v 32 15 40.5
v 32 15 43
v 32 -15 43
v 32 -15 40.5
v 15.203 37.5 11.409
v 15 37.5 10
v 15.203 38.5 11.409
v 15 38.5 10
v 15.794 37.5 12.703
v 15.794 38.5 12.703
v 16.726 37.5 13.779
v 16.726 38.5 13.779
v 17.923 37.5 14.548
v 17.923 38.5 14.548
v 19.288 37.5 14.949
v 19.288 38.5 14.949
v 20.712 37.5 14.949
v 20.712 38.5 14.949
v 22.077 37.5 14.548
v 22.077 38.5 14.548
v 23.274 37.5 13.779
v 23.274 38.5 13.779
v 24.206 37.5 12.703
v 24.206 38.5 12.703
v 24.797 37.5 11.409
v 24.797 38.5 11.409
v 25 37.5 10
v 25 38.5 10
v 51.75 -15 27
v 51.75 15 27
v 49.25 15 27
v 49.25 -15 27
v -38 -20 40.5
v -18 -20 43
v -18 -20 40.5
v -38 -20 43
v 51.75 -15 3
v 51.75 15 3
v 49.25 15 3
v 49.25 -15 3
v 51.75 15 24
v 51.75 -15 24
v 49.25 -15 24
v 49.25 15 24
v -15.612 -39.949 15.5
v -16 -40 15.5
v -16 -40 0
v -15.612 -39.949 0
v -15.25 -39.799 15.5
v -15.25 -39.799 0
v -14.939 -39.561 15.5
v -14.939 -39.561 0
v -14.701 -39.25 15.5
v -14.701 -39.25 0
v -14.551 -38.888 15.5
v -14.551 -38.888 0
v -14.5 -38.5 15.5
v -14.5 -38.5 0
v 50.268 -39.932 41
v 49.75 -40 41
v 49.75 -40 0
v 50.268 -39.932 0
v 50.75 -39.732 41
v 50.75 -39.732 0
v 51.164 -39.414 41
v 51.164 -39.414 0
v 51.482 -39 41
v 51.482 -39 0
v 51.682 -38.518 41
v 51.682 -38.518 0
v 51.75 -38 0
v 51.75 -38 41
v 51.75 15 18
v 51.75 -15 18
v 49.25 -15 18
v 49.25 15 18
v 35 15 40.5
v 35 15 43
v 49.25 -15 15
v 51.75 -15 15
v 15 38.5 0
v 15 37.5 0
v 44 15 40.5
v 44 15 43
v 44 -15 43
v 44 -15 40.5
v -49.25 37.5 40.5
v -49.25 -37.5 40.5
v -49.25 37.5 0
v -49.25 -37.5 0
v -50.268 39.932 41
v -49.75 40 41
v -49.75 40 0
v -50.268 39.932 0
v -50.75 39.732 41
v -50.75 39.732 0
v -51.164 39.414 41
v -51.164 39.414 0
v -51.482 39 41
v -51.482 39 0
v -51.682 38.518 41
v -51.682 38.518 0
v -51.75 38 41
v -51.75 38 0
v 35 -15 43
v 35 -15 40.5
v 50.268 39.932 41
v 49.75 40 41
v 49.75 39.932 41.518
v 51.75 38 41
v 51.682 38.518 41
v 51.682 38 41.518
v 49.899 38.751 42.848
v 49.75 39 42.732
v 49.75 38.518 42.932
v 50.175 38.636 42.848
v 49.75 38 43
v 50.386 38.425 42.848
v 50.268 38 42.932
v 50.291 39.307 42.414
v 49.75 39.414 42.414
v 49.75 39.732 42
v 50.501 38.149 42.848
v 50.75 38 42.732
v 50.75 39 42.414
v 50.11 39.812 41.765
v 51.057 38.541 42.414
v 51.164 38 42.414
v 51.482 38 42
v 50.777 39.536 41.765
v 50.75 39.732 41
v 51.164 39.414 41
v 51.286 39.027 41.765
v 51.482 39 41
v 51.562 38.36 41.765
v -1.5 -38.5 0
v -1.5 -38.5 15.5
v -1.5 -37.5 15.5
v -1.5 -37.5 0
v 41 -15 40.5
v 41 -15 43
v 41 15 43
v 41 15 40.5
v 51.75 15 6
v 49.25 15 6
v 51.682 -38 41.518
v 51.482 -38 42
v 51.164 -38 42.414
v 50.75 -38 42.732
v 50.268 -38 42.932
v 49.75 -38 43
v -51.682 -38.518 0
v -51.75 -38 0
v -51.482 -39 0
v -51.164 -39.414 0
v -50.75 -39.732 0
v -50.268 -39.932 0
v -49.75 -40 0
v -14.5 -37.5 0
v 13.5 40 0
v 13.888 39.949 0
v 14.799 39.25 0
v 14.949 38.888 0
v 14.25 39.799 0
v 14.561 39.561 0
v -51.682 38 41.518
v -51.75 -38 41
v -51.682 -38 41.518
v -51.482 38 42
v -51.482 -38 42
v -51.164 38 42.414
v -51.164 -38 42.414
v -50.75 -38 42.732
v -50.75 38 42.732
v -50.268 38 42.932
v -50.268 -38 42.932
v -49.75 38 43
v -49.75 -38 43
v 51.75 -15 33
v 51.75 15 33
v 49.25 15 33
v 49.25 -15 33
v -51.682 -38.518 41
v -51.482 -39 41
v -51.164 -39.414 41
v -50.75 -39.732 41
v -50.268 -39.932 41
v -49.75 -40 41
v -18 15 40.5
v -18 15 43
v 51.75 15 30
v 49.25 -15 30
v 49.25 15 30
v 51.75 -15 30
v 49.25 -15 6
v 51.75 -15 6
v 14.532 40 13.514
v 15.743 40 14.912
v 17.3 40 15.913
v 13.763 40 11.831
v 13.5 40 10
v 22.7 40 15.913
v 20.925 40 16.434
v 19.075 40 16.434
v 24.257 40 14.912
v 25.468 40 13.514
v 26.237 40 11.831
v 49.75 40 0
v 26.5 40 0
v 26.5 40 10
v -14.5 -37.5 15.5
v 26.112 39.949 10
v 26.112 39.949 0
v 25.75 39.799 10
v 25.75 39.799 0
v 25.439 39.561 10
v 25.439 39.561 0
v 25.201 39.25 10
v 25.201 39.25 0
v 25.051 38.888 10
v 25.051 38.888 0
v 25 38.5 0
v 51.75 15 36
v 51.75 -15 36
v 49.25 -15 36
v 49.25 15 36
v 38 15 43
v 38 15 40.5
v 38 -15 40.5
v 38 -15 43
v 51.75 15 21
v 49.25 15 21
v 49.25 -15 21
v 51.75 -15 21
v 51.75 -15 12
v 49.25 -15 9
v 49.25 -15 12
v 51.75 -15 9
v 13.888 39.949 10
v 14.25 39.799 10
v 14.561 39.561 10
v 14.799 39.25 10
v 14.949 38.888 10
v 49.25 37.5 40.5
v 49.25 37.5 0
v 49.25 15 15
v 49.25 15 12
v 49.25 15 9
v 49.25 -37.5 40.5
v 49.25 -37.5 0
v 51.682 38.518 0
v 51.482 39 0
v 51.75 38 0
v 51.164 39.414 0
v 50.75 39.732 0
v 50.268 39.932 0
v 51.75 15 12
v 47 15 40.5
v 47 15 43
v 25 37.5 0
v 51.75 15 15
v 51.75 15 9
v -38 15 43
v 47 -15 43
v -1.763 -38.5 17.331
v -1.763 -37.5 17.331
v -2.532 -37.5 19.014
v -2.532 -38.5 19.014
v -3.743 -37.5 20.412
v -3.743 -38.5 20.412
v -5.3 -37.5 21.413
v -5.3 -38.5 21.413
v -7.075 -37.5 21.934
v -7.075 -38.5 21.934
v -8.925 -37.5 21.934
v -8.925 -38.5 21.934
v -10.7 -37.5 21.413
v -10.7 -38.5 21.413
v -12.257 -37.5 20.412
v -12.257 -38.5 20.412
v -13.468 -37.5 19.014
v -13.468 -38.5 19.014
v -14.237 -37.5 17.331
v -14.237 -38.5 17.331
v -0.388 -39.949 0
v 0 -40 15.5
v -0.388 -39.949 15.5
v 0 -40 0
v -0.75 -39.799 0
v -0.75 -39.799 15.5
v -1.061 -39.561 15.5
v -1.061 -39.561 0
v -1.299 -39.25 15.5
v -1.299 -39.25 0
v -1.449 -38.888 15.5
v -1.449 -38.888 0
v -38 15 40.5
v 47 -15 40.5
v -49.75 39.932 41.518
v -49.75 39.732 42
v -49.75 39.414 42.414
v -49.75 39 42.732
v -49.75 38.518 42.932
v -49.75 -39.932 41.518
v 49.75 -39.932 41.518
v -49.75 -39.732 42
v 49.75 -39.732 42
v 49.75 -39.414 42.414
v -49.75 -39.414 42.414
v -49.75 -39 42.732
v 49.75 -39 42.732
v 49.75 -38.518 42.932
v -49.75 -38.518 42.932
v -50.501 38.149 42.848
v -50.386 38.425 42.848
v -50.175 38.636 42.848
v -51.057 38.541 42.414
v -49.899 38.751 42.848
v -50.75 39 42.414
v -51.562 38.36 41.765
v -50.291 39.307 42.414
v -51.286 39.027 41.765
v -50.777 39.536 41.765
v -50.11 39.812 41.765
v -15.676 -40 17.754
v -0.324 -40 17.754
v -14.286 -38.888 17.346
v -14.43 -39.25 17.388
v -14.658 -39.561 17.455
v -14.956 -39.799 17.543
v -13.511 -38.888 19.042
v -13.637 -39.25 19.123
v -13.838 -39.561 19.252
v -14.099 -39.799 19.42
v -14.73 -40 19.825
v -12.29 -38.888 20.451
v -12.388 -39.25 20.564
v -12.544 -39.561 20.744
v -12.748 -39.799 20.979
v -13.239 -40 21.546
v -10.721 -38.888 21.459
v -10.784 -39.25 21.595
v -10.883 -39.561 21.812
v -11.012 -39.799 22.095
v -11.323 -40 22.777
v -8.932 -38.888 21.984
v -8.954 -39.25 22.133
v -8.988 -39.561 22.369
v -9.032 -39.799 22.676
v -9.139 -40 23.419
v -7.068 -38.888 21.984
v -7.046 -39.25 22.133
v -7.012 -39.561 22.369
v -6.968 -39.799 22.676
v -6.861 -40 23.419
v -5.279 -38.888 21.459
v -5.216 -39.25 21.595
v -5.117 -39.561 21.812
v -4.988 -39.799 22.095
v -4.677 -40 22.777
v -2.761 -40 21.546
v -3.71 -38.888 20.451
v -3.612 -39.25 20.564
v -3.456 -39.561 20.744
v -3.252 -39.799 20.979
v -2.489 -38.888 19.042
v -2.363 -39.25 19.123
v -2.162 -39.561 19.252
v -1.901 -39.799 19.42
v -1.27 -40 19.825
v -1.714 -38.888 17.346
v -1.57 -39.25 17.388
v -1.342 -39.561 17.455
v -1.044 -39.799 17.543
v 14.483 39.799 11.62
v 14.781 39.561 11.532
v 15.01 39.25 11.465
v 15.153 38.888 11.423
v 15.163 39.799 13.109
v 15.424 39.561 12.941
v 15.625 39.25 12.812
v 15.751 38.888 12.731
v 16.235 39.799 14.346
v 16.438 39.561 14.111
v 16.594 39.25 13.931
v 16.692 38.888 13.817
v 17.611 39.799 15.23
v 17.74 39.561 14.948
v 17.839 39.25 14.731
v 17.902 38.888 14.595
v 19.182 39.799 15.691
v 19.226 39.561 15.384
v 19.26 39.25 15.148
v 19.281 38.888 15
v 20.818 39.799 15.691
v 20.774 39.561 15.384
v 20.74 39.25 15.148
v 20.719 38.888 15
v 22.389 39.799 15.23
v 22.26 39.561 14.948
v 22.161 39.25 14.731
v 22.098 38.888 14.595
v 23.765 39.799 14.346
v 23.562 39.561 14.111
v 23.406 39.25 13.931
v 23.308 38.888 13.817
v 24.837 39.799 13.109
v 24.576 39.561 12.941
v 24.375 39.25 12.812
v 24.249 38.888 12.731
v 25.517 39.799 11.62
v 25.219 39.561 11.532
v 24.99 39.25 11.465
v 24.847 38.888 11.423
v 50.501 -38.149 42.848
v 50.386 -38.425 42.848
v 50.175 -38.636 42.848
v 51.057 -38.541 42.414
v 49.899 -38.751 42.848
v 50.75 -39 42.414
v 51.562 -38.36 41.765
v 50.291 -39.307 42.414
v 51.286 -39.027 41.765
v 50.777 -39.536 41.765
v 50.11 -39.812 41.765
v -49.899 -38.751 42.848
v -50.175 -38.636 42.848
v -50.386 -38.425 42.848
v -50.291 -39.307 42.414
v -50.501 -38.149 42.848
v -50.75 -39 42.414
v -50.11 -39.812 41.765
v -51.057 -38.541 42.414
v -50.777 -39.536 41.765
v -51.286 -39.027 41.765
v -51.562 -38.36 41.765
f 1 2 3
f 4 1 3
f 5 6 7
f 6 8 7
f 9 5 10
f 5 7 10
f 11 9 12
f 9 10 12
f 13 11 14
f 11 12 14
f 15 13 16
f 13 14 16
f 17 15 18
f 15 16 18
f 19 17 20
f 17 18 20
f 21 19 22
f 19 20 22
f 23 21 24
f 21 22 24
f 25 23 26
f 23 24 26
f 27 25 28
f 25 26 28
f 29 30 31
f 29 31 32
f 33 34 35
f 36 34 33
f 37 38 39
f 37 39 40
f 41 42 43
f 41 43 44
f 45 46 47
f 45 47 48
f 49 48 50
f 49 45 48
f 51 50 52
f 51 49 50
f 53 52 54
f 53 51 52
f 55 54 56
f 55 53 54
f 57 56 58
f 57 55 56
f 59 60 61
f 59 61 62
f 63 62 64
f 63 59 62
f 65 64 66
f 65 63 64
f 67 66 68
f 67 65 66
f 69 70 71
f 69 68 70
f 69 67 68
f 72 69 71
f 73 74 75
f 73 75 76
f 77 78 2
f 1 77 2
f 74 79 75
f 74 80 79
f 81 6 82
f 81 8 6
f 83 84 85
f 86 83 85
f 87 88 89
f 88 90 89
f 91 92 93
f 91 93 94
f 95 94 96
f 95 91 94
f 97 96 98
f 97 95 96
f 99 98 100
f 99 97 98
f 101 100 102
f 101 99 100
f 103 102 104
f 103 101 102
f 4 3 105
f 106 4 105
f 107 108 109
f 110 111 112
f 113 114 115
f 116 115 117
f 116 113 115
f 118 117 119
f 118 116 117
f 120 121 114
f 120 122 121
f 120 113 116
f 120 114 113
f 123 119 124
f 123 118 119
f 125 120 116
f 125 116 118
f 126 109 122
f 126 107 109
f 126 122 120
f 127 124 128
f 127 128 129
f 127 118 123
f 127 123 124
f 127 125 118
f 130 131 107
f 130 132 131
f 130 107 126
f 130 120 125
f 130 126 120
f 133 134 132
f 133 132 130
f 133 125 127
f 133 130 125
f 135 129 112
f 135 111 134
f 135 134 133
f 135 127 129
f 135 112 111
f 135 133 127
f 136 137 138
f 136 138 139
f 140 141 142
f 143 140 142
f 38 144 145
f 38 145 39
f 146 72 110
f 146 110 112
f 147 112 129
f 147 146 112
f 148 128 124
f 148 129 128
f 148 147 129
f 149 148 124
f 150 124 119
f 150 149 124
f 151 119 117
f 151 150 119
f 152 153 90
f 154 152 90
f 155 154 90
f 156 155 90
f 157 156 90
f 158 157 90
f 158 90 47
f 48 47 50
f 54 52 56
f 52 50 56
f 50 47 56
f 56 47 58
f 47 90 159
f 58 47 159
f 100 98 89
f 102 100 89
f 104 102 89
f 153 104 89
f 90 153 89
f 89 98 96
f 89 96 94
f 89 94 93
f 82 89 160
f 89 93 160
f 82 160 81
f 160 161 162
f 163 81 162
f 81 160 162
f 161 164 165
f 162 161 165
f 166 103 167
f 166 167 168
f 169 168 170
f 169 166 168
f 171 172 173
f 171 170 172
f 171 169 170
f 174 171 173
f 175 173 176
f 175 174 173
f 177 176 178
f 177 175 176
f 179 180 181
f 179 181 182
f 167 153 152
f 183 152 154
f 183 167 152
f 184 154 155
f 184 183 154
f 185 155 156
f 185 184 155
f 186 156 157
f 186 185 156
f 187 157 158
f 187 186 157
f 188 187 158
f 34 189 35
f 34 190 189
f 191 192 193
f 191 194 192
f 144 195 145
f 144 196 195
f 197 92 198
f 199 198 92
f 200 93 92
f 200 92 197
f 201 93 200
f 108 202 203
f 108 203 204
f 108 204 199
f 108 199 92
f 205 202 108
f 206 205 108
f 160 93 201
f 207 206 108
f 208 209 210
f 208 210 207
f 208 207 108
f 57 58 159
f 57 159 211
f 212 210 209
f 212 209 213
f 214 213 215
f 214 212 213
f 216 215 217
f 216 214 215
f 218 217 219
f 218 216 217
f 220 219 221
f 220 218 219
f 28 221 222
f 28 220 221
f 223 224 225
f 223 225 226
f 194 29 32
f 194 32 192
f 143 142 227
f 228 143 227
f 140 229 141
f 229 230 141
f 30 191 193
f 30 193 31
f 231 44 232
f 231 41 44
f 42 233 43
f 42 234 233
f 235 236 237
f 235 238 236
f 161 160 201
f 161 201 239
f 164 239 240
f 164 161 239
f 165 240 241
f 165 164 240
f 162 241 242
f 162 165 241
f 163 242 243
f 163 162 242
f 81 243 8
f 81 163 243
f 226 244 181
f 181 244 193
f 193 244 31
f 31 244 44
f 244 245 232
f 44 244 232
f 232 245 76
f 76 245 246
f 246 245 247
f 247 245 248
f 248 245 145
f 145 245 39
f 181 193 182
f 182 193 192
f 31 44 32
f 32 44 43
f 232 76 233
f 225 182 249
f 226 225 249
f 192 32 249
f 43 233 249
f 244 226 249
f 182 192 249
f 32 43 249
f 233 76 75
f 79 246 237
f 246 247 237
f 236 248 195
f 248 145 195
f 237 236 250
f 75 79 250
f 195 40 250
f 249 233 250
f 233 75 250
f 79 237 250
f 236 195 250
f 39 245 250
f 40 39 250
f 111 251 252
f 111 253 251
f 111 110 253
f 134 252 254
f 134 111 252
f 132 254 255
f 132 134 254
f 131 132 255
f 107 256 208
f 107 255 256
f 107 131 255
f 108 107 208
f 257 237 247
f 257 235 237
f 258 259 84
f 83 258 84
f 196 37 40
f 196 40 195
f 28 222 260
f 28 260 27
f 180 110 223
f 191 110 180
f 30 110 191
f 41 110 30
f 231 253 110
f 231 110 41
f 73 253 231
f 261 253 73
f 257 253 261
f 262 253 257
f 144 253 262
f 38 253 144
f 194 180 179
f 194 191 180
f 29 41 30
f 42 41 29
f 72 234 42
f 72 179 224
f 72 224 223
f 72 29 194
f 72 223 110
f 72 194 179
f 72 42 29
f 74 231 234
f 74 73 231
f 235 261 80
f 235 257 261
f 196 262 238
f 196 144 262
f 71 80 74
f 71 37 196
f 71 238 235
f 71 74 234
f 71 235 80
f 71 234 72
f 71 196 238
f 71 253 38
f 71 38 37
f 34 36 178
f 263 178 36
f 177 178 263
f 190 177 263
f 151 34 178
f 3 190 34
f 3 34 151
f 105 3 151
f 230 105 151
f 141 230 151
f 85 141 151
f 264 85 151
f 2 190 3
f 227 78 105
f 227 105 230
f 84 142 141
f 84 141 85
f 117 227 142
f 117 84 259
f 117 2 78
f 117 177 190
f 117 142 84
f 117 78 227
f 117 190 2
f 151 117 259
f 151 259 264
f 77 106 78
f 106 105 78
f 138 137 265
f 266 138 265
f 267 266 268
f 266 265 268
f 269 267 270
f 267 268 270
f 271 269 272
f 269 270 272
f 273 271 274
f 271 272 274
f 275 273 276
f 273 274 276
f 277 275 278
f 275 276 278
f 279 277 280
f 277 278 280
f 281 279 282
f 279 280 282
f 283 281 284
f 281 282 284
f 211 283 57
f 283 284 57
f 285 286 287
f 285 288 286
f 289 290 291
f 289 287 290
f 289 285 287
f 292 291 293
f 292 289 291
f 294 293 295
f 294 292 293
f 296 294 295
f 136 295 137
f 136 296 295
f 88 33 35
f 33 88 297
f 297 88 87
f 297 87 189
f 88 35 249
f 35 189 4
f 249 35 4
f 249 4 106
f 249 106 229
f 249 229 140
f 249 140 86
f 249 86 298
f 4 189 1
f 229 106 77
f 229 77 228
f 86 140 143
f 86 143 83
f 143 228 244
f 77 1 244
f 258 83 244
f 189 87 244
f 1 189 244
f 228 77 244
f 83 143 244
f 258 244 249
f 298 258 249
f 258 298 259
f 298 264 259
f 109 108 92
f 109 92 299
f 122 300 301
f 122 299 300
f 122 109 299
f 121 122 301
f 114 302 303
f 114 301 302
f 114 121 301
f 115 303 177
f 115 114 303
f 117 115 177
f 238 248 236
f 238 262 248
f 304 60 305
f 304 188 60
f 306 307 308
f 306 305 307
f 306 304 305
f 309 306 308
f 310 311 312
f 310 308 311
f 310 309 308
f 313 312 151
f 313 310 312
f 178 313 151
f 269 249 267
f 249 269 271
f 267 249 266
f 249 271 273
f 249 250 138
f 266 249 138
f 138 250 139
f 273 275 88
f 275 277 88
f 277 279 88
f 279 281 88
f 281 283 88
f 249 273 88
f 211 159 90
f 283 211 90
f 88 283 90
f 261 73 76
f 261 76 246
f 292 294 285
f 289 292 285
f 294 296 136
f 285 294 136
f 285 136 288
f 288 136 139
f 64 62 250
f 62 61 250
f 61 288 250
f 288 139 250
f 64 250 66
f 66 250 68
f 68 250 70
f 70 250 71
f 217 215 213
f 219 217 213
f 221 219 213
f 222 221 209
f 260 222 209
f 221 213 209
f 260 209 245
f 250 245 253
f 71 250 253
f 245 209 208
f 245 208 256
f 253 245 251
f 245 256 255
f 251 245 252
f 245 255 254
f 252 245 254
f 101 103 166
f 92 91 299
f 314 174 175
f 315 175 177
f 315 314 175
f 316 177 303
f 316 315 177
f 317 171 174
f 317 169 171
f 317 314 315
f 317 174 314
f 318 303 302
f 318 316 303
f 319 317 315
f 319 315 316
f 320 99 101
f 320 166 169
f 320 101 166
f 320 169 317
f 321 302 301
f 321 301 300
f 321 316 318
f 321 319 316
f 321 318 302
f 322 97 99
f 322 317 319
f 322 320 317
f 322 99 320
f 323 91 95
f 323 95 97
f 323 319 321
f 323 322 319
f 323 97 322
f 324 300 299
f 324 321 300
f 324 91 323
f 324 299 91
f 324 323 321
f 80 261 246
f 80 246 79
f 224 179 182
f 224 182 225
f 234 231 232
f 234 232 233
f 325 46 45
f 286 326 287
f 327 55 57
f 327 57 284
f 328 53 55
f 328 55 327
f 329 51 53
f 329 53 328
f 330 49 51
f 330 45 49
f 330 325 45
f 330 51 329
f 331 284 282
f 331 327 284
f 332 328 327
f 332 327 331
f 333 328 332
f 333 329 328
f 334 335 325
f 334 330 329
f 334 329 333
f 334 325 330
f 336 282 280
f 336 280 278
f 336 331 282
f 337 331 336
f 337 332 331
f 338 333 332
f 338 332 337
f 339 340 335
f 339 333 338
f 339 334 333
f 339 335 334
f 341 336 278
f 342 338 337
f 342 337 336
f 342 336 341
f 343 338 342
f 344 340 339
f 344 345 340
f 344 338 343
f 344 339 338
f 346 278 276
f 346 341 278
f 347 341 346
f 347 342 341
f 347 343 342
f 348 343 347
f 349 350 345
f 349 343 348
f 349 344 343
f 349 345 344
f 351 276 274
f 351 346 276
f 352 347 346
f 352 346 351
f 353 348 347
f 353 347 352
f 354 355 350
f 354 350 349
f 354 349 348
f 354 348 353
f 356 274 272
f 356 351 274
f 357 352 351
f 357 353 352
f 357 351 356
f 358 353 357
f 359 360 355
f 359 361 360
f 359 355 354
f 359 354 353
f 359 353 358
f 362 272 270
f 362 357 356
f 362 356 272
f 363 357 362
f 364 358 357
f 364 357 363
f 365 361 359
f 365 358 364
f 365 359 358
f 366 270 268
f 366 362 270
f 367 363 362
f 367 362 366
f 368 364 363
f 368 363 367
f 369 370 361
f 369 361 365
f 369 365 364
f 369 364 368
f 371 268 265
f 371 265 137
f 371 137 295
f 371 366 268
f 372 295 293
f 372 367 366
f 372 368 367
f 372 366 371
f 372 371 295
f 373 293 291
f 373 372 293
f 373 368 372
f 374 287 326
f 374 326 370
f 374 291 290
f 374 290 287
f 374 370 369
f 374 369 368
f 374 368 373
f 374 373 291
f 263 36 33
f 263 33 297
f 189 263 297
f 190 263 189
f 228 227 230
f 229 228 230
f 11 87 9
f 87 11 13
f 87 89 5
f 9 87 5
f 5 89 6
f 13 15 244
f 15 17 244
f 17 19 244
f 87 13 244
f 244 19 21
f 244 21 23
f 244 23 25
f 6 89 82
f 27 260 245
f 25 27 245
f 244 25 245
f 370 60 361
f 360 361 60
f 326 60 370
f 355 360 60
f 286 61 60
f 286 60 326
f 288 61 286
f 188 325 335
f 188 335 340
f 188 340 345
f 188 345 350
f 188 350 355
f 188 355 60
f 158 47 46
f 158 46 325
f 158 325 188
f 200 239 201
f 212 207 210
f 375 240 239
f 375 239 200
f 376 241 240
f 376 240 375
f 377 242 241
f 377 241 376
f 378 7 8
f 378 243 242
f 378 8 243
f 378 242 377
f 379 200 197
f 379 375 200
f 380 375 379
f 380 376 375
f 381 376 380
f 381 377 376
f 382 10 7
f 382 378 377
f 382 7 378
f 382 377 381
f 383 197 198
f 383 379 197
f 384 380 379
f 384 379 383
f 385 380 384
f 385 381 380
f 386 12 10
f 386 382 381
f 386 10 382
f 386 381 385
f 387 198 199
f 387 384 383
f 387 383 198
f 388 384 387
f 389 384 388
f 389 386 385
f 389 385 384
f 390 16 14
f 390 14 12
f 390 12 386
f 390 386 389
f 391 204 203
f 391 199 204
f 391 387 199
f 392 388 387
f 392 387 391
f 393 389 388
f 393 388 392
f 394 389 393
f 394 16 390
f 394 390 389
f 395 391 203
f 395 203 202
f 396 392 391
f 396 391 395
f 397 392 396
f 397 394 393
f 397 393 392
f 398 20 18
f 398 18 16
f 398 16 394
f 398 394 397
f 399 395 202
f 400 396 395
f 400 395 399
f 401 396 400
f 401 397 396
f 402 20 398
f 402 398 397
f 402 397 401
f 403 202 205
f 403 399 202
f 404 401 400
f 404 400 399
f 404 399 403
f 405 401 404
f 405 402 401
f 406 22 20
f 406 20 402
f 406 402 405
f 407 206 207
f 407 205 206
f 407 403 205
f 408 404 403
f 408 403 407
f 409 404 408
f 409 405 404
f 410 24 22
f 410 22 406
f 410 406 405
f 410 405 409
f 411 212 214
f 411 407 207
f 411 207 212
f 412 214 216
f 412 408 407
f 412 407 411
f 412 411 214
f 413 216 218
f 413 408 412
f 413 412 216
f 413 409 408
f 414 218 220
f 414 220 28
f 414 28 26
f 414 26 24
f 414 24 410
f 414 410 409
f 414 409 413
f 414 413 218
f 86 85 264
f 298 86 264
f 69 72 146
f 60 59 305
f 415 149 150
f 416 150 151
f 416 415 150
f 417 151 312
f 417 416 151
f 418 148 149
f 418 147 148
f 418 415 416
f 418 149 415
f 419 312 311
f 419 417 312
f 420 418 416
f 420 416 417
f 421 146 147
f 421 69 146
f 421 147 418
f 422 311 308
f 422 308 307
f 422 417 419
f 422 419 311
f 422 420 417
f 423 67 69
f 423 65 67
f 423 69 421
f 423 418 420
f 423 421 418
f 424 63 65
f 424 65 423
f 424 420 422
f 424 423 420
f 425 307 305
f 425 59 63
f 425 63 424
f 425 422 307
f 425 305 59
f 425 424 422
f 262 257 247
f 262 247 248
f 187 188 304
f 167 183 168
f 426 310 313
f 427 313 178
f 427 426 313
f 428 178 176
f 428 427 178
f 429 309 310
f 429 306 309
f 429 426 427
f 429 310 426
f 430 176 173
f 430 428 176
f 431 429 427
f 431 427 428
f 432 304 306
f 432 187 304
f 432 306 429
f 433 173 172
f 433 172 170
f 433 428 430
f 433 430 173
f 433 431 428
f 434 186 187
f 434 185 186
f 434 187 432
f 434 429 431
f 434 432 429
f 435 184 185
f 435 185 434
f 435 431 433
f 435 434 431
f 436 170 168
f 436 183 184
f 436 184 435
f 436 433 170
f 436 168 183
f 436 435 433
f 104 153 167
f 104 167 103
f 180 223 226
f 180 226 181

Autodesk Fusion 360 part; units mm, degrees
sketch "スケッチ1" plane through (0, 0, 0) normal (0, 0, 1) x (1, 0, 0)
  line L0 (-51.75, 40) -> (51.75, 40)
  line L1 (51.75, 40) -> (51.75, -40)
  line L2 (51.75, -40) -> (-51.75, -40)
  line L3 (-51.75, -40) -> (-51.75, 40)
  dimension "d1" = 103.5
  dimension "d2" = 80
  dimension "d32" = 51.75
  dimension "d33" = 40
extrude "押し出し1" add sketch "スケッチ1" along normal blind 2.5 makes body 1
extrude "押し出し4" add sketch "スケッチ1" along normal blind 43 separate body makes body 2
shell "シェル2" thickness 2.5 removed faces 1 at (-17.25, -13.3333, 0) on bodies 2
sketch "スケッチ2" plane through (0, -40, 0) normal (0, -1, 0) x (1, 0, 0)
  line L0 (-51.75, 0) -> (51.75, 0)
  line L1 (51.75, 0) -> (51.75, 43)
  line L2 (51.75, 43) -> (-51.75, 43)
  line L3 (-51.75, 43) -> (-51.75, 0)
  line L4 (-14.5, 0) -> (-14.5, 15.5)
  arc A0 (-1.5, 15.5) -> (-14.5, 15.5) centre (-8, 15.5) ccw
  line L5 (-1.5, 15.5) -> (-1.5, 0)
  line L6 (-14.5, 0) -> (-1.5, 0)
  dimension "d13" = 13
  dimension "d45" = 15.5
  dimension "d46" = 8
extrude "押し出し5" cut sketch "スケッチ2" against normal blind 20 contours L0 L4 A0 L5 L6 bodies 2
sketch "スケッチ3" plane through (0, 40, 0) normal (0, 1, 0) x (-1, 0, 0)
  line L0 (-25, -15) -> (-25, 10)
  arc A0 (-15, 10) -> (-25, 10) centre (-20, 10) ccw
  line L1 (-15, 10) -> (-15, -15)
  line L2 (-15, -15) -> (-25, -15)
  line L3 (-51.75, 0) -> (51.75, 0)
  line L4 (51.75, 0) -> (51.75, 43)
  line L5 (51.75, 43) -> (-51.75, 43)
  line L6 (-51.75, 43) -> (-51.75, 0)
  dimension "d17" = 10
  dimension "d42" = 10
  dimension "d44" = 20
extrude "押し出し6" cut sketch "スケッチ3" against normal blind 16 contours L0 A0 L1 L3 bodies 2
fillet "フィレット1" radius 2 4 edges at (-51.75, 40, 21.5) (51.75, 40, 21.5) (51.75, -40, 21.5) (-51.75, -40, 21.5) 1 faces at (-17.25, -13.3333, 43) on bodies 2
fillet "フィレット1" radius 1.5 6 edges at (-14.5, -40, 7.75) (-8, -40, 22) (-1.5, -40, 7.75) (25, 40, 5) (20, 40, 15) (15, 40, 5) on bodies 2
sketch "スケッチ4" plane through (0, 0, 2.5) normal (0, 0, 1) x (-1, 0, 0)
  line L0 (51.75, 40) -> (-51.75, 40)
  line L1 (-51.75, 40) -> (-51.75, -40)
  line L2 (-51.75, -40) -> (51.75, -40)
  line L3 (51.75, -40) -> (51.75, 40)
  line L4 (47.75, -36) -> (-47.75, -36)
  line L5 (-47.75, -36) -> (-47.75, 36)
  line L6 (-47.75, 36) -> (47.75, 36)
  line L7 (47.75, 36) -> (47.75, -36)
  dimension "d20" = 95.5
  dimension "d21" = 72
  dimension "d22" = 47.75
  dimension "d23" = 36
extrude "押し出し7" add sketch "スケッチ4" along normal blind 2 contours L4 L5 L6 L7 bodies 1
sketch "スケッチ6" plane through (0, 0, 0) normal (0, 0, 1) x (1, 0, 0)
  circle A0 centre (-44.5, -32.75) radius 3
  circle A1 centre (1, -32.75) radius 3
  circle A2 centre (-44.5, 32.75) radius 3
  circle A3 centre (1, 32.75) radius 3
  circle A4 centre (6, -14.75) radius 3
  circle A5 centre (43, -14.75) radius 3
  circle A6 centre (43, 22.75) radius 3
  circle A7 centre (6, 22.75) radius 3
  circle A8 centre (-44.5, -32.75) radius 1.65
  circle A9 centre (1, -32.75) radius 1.65
  circle A10 centre (6, -14.75) radius 1.65
  circle A11 centre (43, -14.75) radius 1.65
  circle A12 centre (43, 22.75) radius 1.65
  circle A13 centre (6, 22.75) radius 1.65
  circle A14 centre (1, 32.75) radius 1.65
  circle A15 centre (-44.5, 32.75) radius 1.65
  dimension "d26" = 6
  dimension "d27" = 45.5
  dimension "d28" = 65.5
  dimension "d29" = 32.75
  dimension "d30" = 37
  dimension "d31" = 37.5
  dimension "d34" = 44.5
  dimension "d35" = 5
  dimension "d39" = 3.3
  dimension "d57" = 10
extrude "押し出し8" cut sketch "スケッチ6" along normal blind 2 contours A0 | A1 | A2 | A3 | A4 | A5 | A6 | A7 | A8 | A9 | A10 | A11 | A12 | A13 | A14 | A15 bodies 1
extrude "押し出し9" cut sketch "スケッチ6" along normal through all contours A8 | A9 | A10 | A11 | A12 | A13 | A14 | A15 bodies 1
sketch "スケッチ8" plane through (0, 0, 2.5) normal (0, 0, 1) x (-1, 0, 0)
  line L0 (-47.75, -36) -> (-47.75, 36)
  line L1 (51.75, 40) -> (-51.75, 40)
  line L2 (-51.75, 40) -> (-51.75, -40)
  line L3 (-51.75, -40) -> (51.75, -40)
  line L4 (-37, -37.25) -> (-49, -25.25)
  line L5 (-49, -37.25) -> (-37, -37.25)
  line L6 (-49, 37.25) -> (-49, 25.25)
  line L7 (-49, 25.25) -> (-37, 37.25)
  line L8 (-37, 37.25) -> (-49, 37.25)
  line L9 (-49, -37.25) -> (-49, -25.25)
  line L10 (49, -25) -> (44, -25)
  line L11 (44, -25) -> (44, 25)
  line L12 (44, 25) -> (49, 25)
  line L13 (49, 25) -> (49, -25)
  line L14 (39.5, -37.25) -> (4.5, -37.25)
  line L15 (4.5, -37.25) -> (4.5, -32.25)
  line L16 (4.5, -32.25) -> (39.5, -32.25)
  line L17 (39.5, -32.25) -> (39.5, -37.25)
  line L18 (4.5, 32.25) -> (39.5, 32.25)
  line L19 (39.5, 32.25) -> (39.5, 37.25)
  line L20 (39.5, 37.25) -> (4.5, 37.25)
  line L21 (4.5, 37.25) -> (4.5, 32.25)
  dimension "d50" = 49
  dimension "d51" = 74.5
  dimension "d52" = 37.25
  dimension "d53" = 12
  dimension "d58" = 50
  dimension "d59" = 5
  dimension "d60" = 49
  dimension "d61" = 25
  dimension "d63" = 35
  dimension "d64" = 4.5
extrude "押し出し10" add sketch "スケッチ8" along normal blind 5 bodies 1
fillet "フィレット2" radius 2 4 edges at (-51.75, -40, 1.25) (51.75, -40, 1.25) (51.75, 40, 1.25) (-51.75, 40, 1.25) on bodies 1
sketch "スケッチ10" plane through (0, 0, 43) normal (0, 0, 1) x (-1, 0, 0)
  line L0 (49.75, 38) -> (-49.75, 38)
  line L1 (-49.75, 38) -> (-49.75, -38)
  line L2 (-49.75, -38) -> (49.75, -38)
  line L3 (49.75, -38) -> (49.75, 38)
  line L4 (38, -15) -> (18, -15)
  line L5 (18, -15) -> (18, 20)
  line L6 (18, 20) -> (38, 20)
  line L7 (38, 20) -> (38, -15)
  dimension "d73" = 15
  dimension "d74" = 20
  dimension "d75" = 18
  dimension "d76" = 20
extrude "押し出し13" cut sketch "スケッチ10" against normal blind 25 contours L4 L5 L6 L7 bodies 2
sketch "スケッチ9" plane through (51.75, 0, 0) normal (1, 0, 0) x (0, 1, 0)
  line L0 (-38, 41) -> (-38, 0)
  line L1 (-38, 0) -> (38, 0)
  line L2 (38, 0) -> (38, 41)
  line L3 (38, 41) -> (-38, 41)
  line L4 (-15, 36) -> (15, 36)
  line L5 (15, 36) -> (15, 33)
  line L6 (15, 33) -> (-15, 33)
  line L7 (-15, 33) -> (-15, 36)
  line L8 (15, 27) -> (-15, 27)
  line L9 (-15, 30) -> (15, 30)
  line L10 (15, 30) -> (15, 27)
  line L11 (-15, 27) -> (-15, 30)
  line L12 (15, 21) -> (-15, 21)
  line L13 (-15, 24) -> (15, 24)
  line L14 (15, 24) -> (15, 21)
  line L15 (-15, 21) -> (-15, 24)
  line L16 (15, 15) -> (-15, 15)
  line L17 (-15, 18) -> (15, 18)
  line L18 (15, 18) -> (15, 15)
  line L19 (-15, 15) -> (-15, 18)
  line L20 (15, 9) -> (-15, 9)
  line L21 (-15, 12) -> (15, 12)
  line L22 (15, 12) -> (15, 9)
  line L23 (-15, 9) -> (-15, 12)
  line L24 (15, 3) -> (-15, 3)
  line L25 (-15, 6) -> (15, 6)
  line L26 (15, 6) -> (15, 3)
  line L27 (-15, 3) -> (-15, 6)
  dimension "d80" = 30
  dimension "d81" = 3
  dimension "d82" = 15
  dimension "d85" = 0
  dimension "d86" = -6
  dimension "d89" = 36
extrude "押し出し14" cut sketch "スケッチ9" against normal blind 10 contours L4 L5 L6 L7 | L8 L9 L10 L11 | L12 L13 L14 L15 | L16 L17 L18 L19 | L20 L21 L22 L23 | L24 L25 L26 L27 bodies 2
sketch "スケッチ11" plane through (0, 0, 43) normal (0, 0, 1) x (-1, 0, 0)
  line L0 (18, -15) -> (18, 20)
  line L1 (18, 20) -> (38, 20)
  line L2 (38, 20) -> (38, -15)
  line L3 (38, -15) -> (18, -15)
  line L4 (49.75, 38) -> (-49.75, 38)
  line L5 (-49.75, 38) -> (-49.75, -38)
  line L6 (-49.75, -38) -> (49.75, -38)
  line L7 (49.75, -38) -> (49.75, 38)
  line L8 (-47, -15) -> (-44, -15)
  line L9 (-44, -15) -> (-44, 15)
  line L10 (-44, 15) -> (-47, 15)
  line L11 (-47, 15) -> (-47, -15)
  line L12 (-41, -15) -> (-38, -15)
  line L13 (-38, -15) -> (-38, 15)
  line L14 (-38, 15) -> (-41, 15)
  line L15 (-41, 15) -> (-41, -15)
  line L16 (-35, -15) -> (-32, -15)
  line L17 (-32, -15) -> (-32, 15)
  line L18 (-32, 15) -> (-35, 15)
  line L19 (-35, 15) -> (-35, -15)
  dimension "d90" = 3
  dimension "d91" = 30
  dimension "d92" = 15
extrude "押し出し15" cut sketch "スケッチ11" against normal blind 20 contours L8 L9 L10 L11 | L12 L13 L14 L15 | L16 L17 L18 L19 bodies 2
hidden bodies 1
equation "d1 = 93.5 mm + 10 mm"
equation "d22 = ( 95.5 / 2 ) * 1 mm"
equation "d28 = 70 mm - 4.5 mm"
equation "d29 = ( 65.5 / 2 ) * 1 mm"
equation "d30 = 43.5 mm - 6.5 mm"
equation "d32 = ( 103.5 / 2 ) * 1 mm"
